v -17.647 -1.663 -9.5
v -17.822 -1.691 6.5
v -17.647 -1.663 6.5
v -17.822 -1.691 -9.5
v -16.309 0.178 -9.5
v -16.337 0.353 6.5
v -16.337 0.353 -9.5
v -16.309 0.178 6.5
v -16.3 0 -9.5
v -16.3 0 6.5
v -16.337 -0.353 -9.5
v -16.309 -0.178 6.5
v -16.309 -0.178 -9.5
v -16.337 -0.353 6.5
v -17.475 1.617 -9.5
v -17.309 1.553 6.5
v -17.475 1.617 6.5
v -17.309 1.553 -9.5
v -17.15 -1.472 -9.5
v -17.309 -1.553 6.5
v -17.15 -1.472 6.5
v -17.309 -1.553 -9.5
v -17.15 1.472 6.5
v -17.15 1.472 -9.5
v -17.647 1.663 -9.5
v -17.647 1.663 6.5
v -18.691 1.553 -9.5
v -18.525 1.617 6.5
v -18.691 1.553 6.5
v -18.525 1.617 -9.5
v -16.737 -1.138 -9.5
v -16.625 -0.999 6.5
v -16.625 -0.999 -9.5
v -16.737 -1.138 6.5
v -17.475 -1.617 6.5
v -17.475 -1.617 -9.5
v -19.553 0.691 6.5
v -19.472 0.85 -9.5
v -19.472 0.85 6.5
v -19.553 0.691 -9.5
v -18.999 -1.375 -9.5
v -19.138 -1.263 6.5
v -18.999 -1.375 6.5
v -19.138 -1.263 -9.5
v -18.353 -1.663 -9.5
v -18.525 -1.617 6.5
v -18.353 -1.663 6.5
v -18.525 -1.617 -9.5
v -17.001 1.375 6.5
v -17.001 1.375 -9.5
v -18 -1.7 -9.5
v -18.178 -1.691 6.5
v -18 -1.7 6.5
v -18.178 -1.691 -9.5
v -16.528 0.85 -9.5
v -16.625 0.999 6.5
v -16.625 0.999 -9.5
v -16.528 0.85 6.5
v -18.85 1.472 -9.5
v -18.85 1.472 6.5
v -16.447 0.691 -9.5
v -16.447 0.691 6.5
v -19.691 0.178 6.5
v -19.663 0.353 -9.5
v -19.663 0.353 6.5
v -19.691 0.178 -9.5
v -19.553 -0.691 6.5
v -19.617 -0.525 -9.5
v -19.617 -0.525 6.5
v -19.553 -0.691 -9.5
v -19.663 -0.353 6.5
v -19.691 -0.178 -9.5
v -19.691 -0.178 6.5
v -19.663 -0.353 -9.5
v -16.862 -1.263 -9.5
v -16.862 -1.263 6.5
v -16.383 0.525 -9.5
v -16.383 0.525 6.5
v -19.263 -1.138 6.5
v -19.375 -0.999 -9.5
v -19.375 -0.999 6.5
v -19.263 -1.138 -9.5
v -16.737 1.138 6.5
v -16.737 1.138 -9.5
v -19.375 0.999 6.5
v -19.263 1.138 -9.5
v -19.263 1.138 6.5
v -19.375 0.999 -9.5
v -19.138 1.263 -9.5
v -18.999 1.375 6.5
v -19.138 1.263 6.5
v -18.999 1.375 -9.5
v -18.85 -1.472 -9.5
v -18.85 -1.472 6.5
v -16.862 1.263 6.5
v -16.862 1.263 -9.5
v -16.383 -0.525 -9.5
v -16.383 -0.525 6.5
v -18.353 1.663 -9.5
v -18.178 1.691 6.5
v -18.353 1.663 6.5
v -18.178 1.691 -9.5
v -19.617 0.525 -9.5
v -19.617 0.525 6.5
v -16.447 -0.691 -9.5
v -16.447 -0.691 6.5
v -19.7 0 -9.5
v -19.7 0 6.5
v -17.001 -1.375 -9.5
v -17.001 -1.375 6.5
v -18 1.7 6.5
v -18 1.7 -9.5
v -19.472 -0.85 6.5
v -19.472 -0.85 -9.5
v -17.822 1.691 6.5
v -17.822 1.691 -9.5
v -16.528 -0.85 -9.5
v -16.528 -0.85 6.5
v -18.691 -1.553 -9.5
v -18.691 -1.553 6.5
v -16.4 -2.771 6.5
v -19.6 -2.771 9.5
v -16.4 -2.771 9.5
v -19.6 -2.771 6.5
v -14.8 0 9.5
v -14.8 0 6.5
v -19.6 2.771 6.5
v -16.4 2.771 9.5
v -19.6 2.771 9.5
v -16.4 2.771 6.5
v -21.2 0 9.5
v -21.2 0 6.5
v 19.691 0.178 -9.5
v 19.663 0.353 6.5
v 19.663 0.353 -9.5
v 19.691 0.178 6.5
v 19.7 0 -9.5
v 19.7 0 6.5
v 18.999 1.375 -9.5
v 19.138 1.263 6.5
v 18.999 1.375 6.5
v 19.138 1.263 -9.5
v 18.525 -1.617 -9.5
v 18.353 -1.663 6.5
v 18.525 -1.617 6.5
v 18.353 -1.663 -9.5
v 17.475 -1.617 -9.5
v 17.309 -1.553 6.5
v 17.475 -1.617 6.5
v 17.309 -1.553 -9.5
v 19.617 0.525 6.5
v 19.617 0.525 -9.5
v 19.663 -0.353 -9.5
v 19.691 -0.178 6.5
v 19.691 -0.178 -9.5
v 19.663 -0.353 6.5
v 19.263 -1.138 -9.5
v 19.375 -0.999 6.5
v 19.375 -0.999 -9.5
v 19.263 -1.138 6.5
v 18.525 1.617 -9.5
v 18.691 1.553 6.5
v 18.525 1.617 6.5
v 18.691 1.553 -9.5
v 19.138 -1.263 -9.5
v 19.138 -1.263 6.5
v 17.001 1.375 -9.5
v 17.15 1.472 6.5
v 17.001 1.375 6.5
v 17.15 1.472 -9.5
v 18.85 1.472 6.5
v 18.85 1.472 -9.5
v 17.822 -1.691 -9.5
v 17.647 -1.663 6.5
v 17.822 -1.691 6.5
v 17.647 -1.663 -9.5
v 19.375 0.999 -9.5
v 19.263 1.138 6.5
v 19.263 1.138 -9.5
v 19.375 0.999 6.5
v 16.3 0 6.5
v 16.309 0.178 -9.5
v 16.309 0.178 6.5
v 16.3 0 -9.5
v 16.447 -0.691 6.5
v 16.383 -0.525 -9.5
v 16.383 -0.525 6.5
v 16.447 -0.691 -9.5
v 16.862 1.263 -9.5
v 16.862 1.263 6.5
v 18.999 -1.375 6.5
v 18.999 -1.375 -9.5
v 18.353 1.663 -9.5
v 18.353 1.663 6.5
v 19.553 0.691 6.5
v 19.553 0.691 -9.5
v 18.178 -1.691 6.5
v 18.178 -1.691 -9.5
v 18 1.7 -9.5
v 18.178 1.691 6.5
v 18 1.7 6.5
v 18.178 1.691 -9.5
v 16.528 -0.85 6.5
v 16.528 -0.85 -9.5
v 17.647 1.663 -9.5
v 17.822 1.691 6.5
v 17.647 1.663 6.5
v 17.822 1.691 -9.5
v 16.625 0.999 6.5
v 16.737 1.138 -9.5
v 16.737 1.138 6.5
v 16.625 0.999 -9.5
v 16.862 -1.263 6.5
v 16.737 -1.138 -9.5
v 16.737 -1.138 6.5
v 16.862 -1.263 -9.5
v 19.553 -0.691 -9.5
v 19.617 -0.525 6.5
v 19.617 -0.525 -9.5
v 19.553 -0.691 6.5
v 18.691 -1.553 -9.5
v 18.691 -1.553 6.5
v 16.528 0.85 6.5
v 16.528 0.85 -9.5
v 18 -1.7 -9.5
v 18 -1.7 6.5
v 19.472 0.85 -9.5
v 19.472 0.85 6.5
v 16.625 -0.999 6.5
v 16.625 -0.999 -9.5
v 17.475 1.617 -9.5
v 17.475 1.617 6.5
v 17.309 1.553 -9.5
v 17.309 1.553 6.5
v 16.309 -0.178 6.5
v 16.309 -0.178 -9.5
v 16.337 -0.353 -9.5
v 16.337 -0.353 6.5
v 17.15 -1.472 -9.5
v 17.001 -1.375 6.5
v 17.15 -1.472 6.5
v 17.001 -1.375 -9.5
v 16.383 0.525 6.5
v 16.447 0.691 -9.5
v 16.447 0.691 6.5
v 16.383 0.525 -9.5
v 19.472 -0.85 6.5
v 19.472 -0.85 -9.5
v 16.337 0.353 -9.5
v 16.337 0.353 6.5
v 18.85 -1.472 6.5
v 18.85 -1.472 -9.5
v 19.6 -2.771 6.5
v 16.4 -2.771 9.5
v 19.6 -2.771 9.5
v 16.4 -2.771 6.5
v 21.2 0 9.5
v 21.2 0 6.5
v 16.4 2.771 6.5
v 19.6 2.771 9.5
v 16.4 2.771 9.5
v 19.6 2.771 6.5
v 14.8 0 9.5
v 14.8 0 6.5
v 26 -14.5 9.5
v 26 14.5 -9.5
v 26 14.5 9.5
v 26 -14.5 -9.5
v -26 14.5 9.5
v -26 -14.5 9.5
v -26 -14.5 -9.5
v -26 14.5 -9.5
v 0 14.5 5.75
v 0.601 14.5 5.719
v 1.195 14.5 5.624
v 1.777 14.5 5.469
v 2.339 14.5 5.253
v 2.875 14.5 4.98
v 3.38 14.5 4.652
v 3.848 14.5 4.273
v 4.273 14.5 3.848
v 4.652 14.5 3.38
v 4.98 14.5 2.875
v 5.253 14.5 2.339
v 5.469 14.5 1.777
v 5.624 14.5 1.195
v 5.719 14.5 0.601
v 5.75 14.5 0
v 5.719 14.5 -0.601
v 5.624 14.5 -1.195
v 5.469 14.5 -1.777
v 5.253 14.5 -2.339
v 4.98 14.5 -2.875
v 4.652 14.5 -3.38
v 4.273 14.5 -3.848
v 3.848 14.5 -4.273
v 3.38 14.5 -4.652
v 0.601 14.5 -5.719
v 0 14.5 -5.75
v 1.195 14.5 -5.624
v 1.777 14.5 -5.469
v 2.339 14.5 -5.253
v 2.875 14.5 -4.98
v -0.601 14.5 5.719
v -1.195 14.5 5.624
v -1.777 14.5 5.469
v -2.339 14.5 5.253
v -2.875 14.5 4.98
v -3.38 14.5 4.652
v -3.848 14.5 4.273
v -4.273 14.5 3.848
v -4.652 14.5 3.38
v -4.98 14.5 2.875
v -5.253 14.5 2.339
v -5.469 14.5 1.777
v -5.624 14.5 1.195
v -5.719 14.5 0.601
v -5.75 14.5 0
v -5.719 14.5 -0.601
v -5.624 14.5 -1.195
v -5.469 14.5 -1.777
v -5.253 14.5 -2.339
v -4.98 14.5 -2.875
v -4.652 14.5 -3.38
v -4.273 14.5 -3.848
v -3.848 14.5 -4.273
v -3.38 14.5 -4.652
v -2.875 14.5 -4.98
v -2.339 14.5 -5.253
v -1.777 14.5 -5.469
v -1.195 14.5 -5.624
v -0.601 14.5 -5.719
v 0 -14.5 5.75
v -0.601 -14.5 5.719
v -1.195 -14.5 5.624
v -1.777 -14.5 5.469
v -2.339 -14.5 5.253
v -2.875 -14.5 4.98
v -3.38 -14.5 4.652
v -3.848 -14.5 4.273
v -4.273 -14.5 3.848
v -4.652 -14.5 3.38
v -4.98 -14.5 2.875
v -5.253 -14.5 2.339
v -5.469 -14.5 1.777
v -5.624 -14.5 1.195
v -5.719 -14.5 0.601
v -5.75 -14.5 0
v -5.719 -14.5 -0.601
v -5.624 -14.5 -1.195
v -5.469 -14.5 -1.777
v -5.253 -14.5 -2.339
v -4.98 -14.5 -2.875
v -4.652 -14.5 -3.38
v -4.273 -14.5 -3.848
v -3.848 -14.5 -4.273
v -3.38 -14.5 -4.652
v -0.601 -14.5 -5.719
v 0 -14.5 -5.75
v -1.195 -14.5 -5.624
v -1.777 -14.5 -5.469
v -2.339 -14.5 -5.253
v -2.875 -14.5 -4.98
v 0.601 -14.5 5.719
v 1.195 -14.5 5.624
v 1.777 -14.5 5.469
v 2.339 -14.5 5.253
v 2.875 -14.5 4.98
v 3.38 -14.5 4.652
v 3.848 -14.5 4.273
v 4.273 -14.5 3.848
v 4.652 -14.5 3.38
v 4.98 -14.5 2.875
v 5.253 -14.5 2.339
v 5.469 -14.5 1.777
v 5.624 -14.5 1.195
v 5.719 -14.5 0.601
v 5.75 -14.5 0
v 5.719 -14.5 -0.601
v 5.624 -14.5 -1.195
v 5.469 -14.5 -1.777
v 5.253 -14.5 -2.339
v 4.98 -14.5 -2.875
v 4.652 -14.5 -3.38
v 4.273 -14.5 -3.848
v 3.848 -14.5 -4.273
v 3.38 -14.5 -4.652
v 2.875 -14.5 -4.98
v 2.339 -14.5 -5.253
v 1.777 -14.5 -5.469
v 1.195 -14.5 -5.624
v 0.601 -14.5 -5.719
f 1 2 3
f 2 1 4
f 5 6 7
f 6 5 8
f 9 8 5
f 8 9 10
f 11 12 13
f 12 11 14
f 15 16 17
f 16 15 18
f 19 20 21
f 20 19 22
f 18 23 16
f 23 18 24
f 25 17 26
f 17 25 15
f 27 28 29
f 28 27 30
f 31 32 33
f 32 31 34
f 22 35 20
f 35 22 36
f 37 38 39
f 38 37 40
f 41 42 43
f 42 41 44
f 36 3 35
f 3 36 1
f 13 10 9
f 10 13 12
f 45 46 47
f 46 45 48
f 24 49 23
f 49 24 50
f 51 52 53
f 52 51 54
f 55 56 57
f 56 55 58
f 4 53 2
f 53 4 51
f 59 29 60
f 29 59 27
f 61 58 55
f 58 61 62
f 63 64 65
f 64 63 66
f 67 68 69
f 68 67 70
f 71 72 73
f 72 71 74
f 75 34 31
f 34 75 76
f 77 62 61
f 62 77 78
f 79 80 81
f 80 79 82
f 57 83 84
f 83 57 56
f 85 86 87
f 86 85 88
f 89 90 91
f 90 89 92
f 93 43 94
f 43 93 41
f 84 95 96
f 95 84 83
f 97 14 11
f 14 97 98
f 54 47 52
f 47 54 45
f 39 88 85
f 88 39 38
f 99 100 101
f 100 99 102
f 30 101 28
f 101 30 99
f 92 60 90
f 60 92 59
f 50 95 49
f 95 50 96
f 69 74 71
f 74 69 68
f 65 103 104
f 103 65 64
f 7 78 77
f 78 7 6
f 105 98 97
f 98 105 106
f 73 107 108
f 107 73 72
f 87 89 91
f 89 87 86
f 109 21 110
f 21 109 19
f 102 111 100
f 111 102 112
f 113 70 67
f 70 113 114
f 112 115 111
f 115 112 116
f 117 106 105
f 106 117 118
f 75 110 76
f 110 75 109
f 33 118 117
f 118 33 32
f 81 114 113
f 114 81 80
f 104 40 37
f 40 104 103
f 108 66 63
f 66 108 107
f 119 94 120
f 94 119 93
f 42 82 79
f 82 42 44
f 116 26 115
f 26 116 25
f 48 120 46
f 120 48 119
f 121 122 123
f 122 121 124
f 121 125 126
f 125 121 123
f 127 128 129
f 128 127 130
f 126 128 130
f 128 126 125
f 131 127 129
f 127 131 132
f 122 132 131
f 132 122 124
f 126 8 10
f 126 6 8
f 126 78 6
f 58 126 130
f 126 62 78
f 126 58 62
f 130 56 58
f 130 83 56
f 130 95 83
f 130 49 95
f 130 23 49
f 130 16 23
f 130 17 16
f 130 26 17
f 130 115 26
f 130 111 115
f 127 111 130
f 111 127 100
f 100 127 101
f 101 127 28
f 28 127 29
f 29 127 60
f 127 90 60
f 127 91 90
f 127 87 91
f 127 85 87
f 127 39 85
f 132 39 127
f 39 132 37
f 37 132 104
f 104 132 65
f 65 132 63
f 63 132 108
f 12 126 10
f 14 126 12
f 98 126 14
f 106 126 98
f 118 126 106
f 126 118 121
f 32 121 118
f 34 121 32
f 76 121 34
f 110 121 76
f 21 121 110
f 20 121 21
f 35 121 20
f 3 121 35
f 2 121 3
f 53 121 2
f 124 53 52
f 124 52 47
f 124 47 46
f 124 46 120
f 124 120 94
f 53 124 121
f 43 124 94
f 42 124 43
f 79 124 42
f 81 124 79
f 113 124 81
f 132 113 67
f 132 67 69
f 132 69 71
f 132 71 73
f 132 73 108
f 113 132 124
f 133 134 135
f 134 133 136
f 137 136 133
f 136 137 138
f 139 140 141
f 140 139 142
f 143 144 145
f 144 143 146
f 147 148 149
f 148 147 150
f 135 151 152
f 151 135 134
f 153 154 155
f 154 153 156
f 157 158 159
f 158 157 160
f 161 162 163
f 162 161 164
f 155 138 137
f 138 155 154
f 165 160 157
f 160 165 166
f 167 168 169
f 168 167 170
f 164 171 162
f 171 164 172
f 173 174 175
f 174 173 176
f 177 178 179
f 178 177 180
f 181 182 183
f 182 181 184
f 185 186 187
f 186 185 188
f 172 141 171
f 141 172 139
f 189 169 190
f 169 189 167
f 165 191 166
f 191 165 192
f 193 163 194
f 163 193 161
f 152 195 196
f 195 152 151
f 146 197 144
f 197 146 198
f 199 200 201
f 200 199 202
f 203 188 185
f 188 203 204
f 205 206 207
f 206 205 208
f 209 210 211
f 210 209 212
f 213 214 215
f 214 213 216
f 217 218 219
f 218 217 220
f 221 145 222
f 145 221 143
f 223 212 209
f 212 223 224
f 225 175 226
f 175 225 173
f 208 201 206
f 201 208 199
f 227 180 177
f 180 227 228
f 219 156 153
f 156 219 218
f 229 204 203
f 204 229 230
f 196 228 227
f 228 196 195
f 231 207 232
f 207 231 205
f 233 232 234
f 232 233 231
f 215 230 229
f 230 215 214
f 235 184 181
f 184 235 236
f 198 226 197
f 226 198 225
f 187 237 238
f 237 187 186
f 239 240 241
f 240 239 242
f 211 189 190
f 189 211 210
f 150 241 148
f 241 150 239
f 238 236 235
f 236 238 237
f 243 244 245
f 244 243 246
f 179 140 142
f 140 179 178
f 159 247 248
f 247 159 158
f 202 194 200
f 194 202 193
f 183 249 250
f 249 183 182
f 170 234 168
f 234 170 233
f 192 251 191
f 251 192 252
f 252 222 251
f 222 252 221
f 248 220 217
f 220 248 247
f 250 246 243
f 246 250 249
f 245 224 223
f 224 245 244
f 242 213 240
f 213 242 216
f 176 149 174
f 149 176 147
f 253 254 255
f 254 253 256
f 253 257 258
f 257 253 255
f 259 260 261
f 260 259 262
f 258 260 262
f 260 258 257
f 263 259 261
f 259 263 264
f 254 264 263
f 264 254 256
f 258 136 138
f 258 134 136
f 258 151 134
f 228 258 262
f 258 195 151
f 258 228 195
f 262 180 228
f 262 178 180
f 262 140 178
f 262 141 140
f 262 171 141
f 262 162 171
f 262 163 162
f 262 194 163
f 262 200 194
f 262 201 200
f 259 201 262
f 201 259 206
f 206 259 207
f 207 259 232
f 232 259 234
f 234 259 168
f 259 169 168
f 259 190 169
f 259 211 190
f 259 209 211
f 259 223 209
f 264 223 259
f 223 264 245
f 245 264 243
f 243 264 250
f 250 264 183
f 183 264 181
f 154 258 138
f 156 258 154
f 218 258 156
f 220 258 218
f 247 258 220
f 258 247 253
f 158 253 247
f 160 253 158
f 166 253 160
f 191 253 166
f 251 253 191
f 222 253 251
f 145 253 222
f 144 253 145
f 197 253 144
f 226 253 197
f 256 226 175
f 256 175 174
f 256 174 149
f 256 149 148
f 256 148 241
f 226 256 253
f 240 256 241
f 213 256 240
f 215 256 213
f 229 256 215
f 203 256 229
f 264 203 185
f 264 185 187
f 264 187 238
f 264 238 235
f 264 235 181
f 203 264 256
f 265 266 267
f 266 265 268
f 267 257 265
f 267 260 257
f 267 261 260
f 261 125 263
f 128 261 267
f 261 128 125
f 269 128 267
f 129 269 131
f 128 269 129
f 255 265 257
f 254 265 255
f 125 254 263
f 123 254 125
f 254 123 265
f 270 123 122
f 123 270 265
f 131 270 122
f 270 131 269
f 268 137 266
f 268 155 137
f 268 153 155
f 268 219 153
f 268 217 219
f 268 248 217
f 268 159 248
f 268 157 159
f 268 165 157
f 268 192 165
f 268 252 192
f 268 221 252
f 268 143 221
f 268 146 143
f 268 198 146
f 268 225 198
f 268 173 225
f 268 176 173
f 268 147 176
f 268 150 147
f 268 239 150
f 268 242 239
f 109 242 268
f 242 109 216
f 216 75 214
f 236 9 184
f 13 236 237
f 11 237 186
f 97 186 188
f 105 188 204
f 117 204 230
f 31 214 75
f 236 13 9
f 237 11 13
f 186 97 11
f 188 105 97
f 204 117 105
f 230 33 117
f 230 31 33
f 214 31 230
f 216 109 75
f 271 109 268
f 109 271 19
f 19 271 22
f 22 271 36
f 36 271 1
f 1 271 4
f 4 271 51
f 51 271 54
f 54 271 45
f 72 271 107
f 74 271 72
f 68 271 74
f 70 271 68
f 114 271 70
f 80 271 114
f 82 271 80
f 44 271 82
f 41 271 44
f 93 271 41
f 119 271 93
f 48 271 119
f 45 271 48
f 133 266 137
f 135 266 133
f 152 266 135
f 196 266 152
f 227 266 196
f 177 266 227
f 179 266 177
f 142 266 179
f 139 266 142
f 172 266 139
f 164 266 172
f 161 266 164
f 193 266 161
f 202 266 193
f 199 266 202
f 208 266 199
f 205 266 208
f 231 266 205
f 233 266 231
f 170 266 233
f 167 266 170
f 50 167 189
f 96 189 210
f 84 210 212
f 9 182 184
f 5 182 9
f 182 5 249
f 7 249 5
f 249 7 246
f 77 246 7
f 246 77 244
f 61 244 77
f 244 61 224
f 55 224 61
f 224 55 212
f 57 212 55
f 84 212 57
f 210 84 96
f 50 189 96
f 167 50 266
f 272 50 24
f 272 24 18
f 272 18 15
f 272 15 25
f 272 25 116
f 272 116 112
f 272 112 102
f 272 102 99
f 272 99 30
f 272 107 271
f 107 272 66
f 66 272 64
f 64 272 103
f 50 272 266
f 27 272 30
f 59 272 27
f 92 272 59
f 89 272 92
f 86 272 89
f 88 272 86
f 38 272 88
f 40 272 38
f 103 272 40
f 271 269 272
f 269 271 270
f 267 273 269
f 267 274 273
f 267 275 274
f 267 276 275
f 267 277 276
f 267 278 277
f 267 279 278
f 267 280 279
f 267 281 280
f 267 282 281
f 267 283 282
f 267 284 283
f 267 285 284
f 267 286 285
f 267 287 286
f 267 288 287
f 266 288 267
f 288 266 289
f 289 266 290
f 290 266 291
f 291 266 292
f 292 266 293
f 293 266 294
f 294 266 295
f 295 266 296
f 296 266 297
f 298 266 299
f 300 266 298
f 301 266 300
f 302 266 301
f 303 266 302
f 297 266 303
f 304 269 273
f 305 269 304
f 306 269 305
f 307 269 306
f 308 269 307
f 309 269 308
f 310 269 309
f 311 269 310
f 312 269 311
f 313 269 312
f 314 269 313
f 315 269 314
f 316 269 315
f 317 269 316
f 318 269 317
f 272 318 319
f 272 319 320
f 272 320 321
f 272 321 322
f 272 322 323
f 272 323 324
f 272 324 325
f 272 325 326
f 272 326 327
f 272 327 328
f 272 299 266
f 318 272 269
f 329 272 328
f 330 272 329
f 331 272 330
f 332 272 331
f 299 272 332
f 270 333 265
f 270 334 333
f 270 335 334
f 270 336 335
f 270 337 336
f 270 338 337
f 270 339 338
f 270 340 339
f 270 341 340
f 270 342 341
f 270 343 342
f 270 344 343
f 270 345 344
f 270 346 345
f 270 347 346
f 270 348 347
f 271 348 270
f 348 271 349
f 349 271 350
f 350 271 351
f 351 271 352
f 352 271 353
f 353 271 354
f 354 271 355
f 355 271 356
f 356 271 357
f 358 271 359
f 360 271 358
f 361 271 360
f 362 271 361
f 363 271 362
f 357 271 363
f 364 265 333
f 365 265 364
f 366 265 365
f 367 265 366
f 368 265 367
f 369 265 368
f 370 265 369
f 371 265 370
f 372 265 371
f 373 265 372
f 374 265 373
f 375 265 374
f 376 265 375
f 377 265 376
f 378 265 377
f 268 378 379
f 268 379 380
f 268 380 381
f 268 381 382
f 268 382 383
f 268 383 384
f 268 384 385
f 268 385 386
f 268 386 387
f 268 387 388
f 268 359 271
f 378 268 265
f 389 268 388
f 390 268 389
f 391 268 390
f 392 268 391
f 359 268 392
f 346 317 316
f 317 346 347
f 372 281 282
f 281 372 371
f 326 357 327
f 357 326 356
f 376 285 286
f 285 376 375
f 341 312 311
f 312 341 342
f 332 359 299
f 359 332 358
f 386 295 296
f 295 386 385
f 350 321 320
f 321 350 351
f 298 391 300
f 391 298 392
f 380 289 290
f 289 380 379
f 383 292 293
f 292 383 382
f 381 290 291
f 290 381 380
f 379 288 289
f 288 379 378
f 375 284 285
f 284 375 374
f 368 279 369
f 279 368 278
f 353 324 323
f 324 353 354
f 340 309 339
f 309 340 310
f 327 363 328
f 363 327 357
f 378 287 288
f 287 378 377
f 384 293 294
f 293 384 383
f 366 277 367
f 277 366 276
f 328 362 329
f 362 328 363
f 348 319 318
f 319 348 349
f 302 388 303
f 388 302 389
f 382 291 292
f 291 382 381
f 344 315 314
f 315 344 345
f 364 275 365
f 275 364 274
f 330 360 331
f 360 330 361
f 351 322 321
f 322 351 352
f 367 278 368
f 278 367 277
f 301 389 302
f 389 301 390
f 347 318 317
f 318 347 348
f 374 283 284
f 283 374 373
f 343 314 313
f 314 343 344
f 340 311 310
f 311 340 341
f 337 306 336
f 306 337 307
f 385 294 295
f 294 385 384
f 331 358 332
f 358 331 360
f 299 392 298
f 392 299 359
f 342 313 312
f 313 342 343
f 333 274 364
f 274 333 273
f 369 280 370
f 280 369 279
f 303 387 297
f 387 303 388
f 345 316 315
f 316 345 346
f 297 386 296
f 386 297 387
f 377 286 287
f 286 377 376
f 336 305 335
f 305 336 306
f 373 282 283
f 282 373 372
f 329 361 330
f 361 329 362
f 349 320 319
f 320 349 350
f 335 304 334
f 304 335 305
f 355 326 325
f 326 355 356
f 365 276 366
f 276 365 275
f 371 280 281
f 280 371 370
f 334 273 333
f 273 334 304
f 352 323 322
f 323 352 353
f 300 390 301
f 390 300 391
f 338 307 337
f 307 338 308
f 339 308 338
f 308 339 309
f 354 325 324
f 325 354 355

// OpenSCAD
// Cable strain-relief clamp for 11 mm bundle.
$fn = 60;
eps = 0.02;
body_l = 52;
body_w = 29;
body_h = 19;
cable_d = 11.5;
bolt_pitch = 36;
difference() {
    cube([body_l, body_w, body_h], center = true);
    translate([0, -body_w / 2 - eps, 0]) rotate([-90, 0, 0]) cylinder(d = cable_d, h = body_w + 2 * eps);
    for (x = [-bolt_pitch / 2, bolt_pitch / 2]) {
        translate([x, 0, -body_h / 2 - eps]) cylinder(d = 3.4, h = body_h + 2 * eps);
        translate([x, 0, body_h / 2 - 3]) cylinder(d = 6.4, h = 3 + eps, $fn = 6);
    }
}
